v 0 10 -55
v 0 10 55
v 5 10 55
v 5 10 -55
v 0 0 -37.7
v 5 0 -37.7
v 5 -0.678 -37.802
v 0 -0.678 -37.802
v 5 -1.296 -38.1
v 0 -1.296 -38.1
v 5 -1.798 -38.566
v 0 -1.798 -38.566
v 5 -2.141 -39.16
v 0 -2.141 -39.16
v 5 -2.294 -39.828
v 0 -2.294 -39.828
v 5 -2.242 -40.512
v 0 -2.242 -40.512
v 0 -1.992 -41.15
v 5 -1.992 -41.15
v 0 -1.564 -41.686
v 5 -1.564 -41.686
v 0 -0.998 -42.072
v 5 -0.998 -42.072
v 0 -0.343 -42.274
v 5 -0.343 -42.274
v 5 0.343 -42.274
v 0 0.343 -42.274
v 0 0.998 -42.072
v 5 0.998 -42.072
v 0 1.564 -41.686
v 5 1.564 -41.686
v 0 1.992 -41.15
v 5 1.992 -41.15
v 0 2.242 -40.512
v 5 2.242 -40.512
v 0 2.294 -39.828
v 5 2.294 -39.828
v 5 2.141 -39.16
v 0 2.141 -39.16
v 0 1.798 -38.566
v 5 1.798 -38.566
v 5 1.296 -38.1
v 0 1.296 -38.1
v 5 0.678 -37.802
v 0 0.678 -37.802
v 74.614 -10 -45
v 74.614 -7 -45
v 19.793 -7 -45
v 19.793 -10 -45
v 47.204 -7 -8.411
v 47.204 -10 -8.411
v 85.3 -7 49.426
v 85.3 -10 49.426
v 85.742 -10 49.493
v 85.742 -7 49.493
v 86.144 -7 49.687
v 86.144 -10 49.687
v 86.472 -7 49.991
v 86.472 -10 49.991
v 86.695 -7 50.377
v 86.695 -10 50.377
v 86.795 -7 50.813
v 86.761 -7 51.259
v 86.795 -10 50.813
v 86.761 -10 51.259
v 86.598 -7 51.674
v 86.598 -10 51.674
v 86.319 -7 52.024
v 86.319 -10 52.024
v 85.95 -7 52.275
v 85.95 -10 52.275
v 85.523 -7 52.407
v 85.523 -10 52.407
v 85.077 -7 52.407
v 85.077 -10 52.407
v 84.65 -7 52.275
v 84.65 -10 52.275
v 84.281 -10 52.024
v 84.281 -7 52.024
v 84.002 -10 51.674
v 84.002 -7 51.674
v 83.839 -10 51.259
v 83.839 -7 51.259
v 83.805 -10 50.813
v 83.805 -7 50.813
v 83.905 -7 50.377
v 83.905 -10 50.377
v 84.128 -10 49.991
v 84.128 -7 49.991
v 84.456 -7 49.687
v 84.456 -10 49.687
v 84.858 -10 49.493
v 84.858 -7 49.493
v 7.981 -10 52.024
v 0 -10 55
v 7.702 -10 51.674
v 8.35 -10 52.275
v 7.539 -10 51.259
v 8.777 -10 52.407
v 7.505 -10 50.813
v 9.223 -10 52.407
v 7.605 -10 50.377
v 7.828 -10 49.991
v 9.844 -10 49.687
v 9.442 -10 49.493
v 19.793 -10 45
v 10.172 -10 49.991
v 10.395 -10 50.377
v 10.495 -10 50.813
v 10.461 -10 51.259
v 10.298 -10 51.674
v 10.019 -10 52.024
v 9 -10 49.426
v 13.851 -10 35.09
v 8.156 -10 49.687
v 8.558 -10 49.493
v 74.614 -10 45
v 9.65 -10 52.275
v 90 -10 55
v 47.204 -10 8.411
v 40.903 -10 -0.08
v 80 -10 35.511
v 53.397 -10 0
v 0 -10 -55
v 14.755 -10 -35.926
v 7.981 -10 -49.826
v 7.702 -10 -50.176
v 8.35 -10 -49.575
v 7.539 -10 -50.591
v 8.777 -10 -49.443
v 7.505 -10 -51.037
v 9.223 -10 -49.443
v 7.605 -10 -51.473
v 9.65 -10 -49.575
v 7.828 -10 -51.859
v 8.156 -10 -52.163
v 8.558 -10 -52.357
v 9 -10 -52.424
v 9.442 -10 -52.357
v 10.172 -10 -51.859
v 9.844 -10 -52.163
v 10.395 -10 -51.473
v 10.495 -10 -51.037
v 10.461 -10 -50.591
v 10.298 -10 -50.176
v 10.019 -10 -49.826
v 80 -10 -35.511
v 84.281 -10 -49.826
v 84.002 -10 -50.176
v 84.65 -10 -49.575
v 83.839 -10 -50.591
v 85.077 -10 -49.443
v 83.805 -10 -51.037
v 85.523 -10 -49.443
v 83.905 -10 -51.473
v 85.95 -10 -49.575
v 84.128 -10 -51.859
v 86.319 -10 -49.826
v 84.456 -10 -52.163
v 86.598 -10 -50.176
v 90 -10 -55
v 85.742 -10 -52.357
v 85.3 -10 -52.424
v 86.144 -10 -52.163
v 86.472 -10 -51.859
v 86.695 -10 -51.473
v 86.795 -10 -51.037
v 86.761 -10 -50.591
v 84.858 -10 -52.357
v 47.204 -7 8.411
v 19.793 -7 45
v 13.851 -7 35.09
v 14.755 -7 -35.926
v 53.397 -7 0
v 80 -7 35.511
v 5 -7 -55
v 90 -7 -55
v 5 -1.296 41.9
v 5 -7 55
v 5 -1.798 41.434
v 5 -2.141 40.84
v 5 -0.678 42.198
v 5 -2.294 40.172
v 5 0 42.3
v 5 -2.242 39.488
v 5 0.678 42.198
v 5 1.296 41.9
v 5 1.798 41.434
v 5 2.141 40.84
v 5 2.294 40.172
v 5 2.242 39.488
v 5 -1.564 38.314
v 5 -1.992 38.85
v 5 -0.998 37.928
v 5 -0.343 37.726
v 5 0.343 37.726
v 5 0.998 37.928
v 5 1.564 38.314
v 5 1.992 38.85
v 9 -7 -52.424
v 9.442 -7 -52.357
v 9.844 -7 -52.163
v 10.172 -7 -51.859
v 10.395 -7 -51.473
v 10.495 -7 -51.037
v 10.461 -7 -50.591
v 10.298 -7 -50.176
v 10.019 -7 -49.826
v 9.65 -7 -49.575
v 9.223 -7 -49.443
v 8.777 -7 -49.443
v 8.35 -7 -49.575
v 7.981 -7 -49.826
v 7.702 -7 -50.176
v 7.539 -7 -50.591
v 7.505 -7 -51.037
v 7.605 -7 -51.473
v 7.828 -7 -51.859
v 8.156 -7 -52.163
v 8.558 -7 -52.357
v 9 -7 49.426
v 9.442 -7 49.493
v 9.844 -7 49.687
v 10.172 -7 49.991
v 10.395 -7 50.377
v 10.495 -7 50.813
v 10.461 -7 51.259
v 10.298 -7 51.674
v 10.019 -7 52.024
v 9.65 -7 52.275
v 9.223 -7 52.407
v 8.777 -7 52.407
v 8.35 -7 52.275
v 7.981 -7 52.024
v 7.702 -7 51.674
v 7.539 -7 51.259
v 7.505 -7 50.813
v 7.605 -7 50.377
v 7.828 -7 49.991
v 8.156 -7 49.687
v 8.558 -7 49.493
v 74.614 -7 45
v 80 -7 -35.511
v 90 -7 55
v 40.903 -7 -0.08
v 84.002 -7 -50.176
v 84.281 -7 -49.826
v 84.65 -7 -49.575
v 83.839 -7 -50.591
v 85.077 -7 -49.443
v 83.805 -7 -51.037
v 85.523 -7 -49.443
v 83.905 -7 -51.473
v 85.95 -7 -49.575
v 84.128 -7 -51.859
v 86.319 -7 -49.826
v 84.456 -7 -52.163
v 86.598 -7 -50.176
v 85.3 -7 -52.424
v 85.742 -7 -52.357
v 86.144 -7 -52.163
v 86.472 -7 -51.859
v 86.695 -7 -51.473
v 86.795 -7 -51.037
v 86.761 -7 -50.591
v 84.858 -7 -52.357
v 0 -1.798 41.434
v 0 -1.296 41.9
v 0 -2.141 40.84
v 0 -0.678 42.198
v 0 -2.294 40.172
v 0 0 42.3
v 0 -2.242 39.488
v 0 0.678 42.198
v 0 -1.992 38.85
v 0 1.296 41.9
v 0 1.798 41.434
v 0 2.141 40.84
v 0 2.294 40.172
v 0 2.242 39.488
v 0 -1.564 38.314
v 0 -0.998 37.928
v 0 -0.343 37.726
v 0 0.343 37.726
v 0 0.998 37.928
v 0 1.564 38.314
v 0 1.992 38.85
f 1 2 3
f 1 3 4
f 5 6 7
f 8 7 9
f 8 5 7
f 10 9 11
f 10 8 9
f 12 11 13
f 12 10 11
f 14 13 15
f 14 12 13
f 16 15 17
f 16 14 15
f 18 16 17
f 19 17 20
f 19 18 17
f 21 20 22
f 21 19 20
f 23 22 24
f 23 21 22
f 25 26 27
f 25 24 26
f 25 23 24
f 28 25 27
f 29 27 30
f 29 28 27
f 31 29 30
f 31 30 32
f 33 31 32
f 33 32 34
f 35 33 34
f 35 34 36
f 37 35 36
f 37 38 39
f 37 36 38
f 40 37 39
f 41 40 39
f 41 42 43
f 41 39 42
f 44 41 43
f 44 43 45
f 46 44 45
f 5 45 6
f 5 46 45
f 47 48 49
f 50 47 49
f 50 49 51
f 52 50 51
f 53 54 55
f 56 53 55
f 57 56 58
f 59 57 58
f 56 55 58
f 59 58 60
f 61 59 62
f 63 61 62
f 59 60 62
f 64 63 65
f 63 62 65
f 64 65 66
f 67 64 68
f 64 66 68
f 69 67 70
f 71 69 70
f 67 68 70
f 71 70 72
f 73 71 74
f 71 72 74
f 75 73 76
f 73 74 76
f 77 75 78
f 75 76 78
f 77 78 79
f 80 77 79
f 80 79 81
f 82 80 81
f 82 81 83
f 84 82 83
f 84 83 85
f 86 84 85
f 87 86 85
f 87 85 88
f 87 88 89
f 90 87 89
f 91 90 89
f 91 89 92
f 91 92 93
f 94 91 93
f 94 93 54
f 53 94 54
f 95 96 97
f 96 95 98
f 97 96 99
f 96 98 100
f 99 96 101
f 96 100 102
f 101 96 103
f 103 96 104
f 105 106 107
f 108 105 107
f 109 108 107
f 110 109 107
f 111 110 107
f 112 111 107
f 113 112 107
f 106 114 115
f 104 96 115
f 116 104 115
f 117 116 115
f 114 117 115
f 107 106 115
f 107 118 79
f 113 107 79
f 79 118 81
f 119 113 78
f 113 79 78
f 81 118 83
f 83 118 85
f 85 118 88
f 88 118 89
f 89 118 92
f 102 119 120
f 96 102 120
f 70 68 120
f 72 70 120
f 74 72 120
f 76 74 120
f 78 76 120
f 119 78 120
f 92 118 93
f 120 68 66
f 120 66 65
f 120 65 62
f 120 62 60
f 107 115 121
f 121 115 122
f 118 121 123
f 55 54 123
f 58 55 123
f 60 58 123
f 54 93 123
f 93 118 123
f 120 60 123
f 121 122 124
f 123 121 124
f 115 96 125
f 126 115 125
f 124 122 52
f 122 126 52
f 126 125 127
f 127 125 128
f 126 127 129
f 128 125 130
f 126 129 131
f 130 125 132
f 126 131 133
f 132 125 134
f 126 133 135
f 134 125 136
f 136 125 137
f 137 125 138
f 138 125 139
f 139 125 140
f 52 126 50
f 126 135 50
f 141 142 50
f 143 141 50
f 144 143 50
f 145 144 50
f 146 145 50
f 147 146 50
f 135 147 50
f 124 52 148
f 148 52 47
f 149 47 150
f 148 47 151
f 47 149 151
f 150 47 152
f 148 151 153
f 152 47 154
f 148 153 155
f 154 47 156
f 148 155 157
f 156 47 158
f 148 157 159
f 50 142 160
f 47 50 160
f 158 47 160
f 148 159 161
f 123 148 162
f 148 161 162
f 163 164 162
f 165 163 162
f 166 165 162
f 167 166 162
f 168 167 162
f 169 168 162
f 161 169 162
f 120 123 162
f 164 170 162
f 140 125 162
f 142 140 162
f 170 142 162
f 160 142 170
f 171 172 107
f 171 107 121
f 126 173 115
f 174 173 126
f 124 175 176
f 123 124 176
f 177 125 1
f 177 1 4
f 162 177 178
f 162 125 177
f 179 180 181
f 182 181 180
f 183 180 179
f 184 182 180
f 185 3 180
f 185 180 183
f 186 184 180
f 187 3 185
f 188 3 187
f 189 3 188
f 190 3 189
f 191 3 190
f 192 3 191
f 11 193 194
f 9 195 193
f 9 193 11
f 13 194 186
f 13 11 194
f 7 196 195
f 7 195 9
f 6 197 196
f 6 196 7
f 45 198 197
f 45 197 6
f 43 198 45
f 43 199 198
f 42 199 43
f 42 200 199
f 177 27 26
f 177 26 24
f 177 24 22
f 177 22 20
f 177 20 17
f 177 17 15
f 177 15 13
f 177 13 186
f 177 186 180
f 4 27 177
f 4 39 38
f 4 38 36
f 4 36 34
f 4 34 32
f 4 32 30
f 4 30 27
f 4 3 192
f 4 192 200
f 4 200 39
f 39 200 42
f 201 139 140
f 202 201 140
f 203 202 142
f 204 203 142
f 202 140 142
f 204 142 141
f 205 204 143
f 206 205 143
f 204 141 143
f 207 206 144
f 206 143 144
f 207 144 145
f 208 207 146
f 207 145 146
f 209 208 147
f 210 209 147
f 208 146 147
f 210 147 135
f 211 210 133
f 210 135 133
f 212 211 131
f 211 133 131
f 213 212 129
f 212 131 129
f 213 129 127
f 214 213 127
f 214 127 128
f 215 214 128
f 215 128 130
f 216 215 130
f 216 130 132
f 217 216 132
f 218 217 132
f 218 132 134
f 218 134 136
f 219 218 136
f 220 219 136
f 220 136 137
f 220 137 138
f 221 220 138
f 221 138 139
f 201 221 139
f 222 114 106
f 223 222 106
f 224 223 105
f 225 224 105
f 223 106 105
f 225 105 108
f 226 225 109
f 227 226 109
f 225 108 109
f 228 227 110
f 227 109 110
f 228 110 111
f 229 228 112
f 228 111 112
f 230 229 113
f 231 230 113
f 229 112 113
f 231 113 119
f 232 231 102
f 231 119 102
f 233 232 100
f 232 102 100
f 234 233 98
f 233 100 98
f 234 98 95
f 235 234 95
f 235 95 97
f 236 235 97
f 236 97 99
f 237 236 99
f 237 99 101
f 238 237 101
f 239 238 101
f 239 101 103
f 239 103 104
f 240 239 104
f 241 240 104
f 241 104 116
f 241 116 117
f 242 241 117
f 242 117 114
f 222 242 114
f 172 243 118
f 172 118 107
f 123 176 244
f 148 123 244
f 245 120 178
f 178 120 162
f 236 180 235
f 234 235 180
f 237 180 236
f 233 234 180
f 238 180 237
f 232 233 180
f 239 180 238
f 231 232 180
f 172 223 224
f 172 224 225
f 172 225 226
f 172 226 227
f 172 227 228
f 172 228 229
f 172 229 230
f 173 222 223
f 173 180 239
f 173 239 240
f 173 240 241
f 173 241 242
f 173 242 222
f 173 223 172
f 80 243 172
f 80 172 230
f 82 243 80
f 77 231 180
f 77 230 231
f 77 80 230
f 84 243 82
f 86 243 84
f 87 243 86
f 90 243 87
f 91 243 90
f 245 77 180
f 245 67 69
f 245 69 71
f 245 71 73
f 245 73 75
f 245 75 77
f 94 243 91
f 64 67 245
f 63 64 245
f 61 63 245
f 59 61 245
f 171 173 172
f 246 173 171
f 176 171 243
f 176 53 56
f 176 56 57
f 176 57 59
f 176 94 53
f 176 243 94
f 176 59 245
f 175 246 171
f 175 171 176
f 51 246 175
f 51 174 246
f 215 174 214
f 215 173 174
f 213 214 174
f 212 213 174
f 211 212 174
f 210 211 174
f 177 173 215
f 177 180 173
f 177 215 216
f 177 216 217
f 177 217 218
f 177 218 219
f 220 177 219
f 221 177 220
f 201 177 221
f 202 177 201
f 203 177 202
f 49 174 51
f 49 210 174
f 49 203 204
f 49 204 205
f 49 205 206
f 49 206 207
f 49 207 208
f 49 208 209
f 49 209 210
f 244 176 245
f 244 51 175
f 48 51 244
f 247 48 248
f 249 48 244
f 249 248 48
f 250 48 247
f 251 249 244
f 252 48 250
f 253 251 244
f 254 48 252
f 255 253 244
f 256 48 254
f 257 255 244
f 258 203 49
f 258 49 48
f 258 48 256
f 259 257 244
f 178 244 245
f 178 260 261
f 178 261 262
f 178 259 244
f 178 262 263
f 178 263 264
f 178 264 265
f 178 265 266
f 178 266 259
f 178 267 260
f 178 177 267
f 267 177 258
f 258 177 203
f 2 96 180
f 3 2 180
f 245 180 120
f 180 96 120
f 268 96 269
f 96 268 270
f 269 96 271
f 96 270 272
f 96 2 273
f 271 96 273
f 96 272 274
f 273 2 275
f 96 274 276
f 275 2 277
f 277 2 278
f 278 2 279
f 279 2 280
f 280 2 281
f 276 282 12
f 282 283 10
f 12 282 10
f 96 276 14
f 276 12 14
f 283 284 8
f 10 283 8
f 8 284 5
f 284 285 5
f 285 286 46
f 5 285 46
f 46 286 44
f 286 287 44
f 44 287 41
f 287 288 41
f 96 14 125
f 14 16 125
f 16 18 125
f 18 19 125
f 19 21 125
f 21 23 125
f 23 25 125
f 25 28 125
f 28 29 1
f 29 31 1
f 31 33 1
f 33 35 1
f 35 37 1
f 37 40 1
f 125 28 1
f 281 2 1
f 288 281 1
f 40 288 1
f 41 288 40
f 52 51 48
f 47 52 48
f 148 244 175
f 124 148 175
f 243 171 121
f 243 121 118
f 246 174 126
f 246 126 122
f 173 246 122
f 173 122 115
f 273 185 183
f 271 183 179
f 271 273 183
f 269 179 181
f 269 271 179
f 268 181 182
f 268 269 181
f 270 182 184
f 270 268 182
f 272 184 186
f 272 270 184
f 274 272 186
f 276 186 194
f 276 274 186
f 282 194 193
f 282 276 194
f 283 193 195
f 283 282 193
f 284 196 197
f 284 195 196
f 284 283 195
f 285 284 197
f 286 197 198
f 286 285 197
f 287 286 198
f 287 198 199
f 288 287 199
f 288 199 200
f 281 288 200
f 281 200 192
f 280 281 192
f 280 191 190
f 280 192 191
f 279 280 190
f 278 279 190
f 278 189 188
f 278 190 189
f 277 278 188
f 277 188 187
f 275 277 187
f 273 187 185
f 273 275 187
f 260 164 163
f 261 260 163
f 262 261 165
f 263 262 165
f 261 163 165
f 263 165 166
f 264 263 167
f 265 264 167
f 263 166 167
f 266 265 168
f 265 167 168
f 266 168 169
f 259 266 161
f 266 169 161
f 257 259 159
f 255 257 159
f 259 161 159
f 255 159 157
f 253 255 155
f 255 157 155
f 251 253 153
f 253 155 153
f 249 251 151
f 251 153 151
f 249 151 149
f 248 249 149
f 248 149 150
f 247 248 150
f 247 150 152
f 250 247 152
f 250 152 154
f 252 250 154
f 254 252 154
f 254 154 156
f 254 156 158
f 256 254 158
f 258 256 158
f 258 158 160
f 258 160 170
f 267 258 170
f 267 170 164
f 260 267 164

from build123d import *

# Parameters (mm, degrees)
SKETCH2_W           = 110
SKETCH2_H           = 20
BOSS_EXTRUDE1_DEPTH = 5
SKETCH3_W           = 85
SKETCH3_H           = 110
BOSS_EXTRUDE2_DEPTH = 3
SKETCH4_R           = 2.3
CUT_EXTRUDE2_DEPTH  = 10
SKETCH5_R           = 1.498794896
CUT_EXTRUDE3_DEPTH  = 10
CUT_EXTRUDE4_DEPTH  = 10


with BuildPart() as part:
    # Sketch2 → Boss-Extrude1 (new body)
    with BuildSketch(Plane(origin=(0, 0, 0), x_dir=(0, 0, -1), z_dir=(1, 0, 0))):
        Rectangle(SKETCH2_W, SKETCH2_H)
    extrude(amount=BOSS_EXTRUDE1_DEPTH)

    # Sketch3 → Boss-Extrude2 (add)
    with BuildSketch(Plane(origin=(0, -10, 0), x_dir=(1, 0, 0), z_dir=(0, 1, 0))):
        with Locations((47.5, 0)):
            Rectangle(SKETCH3_W, SKETCH3_H)
    extrude(amount=BOSS_EXTRUDE2_DEPTH)

    # Sketch4 → Cut-Extrude2 (cut)
    with BuildSketch(Plane(origin=(0, 0, 0), x_dir=(0, 0, -1), z_dir=(1, 0, 0))):
        with Locations(Location((40, 0, 0), (0, 0, 180))):
            Circle(SKETCH4_R)
        with Locations(Location((-40, 0, 0), (0, 0, 180))):
            Circle(SKETCH4_R)
    extrude(amount=CUT_EXTRUDE2_DEPTH, mode=Mode.SUBTRACT)

    # Sketch5 → Cut-Extrude3 (cut)
    with BuildSketch(Plane.XZ.offset(10)):
        with Locations(Location((9, 50.925, 0), (0, 0, 270))):
            Circle(SKETCH5_R)
        with Locations(Location((85.3, 50.925, 0), (0, 0, 270))):
            Circle(SKETCH5_R)
        with Locations(Location((85.3, -50.925, 0), (0, 0, 270))):
            Circle(SKETCH5_R)
        with Locations(Location((9, -50.925, 0), (0, 0, 270))):
            Circle(SKETCH5_R)
    extrude(amount=-CUT_EXTRUDE3_DEPTH, mode=Mode.SUBTRACT)

    # Sketch6 → Cut-Extrude4 (cut)
    with BuildSketch(Plane(origin=(0, -7, 0), x_dir=(1, 0, 0), z_dir=(0, 1, 0))):
        Polygon((80, 35.510778555), (53.397423626, 0), (80, -35.510778555), align=None)
        Polygon((40.903082344, 0.079509445), (13.850723409, -35.089828613), (14.754597533, 35.925976571), align=None)
        Polygon((19.79313121, 45), (47.203523895, 8.410897837), (74.613916581, 45), align=None)
        Polygon((47.203523895, -8.410897837), (74.613916581, -45), (19.79313121, -45), align=None)
    extrude(amount=-CUT_EXTRUDE4_DEPTH, mode=Mode.SUBTRACT)


solid = part.part
